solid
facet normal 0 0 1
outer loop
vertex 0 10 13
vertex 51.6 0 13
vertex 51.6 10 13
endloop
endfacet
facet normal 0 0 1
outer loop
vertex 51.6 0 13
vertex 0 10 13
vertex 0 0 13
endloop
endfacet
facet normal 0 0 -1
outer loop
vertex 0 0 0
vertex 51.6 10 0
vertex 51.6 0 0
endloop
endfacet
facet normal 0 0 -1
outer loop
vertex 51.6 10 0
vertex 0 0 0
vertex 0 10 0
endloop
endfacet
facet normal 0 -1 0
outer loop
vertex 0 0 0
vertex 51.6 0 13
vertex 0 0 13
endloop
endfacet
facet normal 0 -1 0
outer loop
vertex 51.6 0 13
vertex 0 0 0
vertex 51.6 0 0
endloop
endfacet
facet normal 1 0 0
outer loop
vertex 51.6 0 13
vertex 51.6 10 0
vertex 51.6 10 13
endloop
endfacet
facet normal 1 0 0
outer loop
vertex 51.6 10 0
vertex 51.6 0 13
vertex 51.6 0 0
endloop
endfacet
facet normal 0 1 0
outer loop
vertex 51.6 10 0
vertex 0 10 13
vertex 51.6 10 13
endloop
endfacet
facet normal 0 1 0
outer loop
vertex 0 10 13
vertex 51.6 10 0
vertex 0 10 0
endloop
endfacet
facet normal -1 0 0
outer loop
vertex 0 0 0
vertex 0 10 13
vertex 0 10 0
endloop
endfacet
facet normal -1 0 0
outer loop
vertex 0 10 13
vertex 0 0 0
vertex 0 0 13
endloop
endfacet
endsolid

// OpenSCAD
// ATX 24-Pin Power Connector
// Standard motherboard power connector

module atx_24pin_connector() {
    // ATX 24-pin connector dimensions
    conn_length = 51.6;
    conn_width = 10;
    conn_height = 13;

    color("black") {
        cube([conn_length, conn_width, conn_height]);
    }
}

// Preview
atx_24pin_connector();
